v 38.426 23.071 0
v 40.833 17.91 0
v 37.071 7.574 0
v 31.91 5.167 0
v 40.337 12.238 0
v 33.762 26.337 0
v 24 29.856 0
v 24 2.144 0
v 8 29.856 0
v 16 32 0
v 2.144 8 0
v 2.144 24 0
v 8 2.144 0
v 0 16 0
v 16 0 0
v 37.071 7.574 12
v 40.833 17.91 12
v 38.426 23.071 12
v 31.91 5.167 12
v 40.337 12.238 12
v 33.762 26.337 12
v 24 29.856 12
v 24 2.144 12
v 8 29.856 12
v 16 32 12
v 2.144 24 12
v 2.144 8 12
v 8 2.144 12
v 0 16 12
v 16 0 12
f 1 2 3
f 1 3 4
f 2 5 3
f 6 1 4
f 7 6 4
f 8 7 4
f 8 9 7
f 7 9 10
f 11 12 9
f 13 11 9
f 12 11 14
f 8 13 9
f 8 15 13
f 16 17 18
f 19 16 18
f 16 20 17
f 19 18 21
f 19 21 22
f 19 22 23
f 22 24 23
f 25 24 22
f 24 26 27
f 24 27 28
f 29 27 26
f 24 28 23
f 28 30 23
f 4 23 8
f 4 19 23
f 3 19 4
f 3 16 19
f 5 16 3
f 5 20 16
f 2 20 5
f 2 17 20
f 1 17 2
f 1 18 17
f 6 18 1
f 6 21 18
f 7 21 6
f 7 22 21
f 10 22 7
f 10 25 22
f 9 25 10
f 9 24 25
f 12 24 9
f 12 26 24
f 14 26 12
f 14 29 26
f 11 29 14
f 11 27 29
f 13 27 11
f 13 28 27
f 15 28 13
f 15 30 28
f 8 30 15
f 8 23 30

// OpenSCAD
$fn = 32;

// ----------------------------------------------------------------------
// Eccentric disc: step, 12 mm thick
// ----------------------------------------------------------------------

// --- parameters (mm) ---
profile_height = 12;      // extrusion height
profile_points = 15;      // points of the closed outline

profile = [[0, 16], [2.144, 8], [8, 2.144], [16, 0], [24, 2.144], [31.91, 5.167], [37.071, 7.574], [40.337, 12.238], [40.833, 17.91], [38.426, 23.071], [33.762, 26.337], [24, 29.856], [16, 32], [8, 29.856], [2.144, 24]];  // single closed polygon, 15 points, counter clockwise

// --- the one profile operation ---
linear_extrude(height = profile_height) polygon(points = profile);
